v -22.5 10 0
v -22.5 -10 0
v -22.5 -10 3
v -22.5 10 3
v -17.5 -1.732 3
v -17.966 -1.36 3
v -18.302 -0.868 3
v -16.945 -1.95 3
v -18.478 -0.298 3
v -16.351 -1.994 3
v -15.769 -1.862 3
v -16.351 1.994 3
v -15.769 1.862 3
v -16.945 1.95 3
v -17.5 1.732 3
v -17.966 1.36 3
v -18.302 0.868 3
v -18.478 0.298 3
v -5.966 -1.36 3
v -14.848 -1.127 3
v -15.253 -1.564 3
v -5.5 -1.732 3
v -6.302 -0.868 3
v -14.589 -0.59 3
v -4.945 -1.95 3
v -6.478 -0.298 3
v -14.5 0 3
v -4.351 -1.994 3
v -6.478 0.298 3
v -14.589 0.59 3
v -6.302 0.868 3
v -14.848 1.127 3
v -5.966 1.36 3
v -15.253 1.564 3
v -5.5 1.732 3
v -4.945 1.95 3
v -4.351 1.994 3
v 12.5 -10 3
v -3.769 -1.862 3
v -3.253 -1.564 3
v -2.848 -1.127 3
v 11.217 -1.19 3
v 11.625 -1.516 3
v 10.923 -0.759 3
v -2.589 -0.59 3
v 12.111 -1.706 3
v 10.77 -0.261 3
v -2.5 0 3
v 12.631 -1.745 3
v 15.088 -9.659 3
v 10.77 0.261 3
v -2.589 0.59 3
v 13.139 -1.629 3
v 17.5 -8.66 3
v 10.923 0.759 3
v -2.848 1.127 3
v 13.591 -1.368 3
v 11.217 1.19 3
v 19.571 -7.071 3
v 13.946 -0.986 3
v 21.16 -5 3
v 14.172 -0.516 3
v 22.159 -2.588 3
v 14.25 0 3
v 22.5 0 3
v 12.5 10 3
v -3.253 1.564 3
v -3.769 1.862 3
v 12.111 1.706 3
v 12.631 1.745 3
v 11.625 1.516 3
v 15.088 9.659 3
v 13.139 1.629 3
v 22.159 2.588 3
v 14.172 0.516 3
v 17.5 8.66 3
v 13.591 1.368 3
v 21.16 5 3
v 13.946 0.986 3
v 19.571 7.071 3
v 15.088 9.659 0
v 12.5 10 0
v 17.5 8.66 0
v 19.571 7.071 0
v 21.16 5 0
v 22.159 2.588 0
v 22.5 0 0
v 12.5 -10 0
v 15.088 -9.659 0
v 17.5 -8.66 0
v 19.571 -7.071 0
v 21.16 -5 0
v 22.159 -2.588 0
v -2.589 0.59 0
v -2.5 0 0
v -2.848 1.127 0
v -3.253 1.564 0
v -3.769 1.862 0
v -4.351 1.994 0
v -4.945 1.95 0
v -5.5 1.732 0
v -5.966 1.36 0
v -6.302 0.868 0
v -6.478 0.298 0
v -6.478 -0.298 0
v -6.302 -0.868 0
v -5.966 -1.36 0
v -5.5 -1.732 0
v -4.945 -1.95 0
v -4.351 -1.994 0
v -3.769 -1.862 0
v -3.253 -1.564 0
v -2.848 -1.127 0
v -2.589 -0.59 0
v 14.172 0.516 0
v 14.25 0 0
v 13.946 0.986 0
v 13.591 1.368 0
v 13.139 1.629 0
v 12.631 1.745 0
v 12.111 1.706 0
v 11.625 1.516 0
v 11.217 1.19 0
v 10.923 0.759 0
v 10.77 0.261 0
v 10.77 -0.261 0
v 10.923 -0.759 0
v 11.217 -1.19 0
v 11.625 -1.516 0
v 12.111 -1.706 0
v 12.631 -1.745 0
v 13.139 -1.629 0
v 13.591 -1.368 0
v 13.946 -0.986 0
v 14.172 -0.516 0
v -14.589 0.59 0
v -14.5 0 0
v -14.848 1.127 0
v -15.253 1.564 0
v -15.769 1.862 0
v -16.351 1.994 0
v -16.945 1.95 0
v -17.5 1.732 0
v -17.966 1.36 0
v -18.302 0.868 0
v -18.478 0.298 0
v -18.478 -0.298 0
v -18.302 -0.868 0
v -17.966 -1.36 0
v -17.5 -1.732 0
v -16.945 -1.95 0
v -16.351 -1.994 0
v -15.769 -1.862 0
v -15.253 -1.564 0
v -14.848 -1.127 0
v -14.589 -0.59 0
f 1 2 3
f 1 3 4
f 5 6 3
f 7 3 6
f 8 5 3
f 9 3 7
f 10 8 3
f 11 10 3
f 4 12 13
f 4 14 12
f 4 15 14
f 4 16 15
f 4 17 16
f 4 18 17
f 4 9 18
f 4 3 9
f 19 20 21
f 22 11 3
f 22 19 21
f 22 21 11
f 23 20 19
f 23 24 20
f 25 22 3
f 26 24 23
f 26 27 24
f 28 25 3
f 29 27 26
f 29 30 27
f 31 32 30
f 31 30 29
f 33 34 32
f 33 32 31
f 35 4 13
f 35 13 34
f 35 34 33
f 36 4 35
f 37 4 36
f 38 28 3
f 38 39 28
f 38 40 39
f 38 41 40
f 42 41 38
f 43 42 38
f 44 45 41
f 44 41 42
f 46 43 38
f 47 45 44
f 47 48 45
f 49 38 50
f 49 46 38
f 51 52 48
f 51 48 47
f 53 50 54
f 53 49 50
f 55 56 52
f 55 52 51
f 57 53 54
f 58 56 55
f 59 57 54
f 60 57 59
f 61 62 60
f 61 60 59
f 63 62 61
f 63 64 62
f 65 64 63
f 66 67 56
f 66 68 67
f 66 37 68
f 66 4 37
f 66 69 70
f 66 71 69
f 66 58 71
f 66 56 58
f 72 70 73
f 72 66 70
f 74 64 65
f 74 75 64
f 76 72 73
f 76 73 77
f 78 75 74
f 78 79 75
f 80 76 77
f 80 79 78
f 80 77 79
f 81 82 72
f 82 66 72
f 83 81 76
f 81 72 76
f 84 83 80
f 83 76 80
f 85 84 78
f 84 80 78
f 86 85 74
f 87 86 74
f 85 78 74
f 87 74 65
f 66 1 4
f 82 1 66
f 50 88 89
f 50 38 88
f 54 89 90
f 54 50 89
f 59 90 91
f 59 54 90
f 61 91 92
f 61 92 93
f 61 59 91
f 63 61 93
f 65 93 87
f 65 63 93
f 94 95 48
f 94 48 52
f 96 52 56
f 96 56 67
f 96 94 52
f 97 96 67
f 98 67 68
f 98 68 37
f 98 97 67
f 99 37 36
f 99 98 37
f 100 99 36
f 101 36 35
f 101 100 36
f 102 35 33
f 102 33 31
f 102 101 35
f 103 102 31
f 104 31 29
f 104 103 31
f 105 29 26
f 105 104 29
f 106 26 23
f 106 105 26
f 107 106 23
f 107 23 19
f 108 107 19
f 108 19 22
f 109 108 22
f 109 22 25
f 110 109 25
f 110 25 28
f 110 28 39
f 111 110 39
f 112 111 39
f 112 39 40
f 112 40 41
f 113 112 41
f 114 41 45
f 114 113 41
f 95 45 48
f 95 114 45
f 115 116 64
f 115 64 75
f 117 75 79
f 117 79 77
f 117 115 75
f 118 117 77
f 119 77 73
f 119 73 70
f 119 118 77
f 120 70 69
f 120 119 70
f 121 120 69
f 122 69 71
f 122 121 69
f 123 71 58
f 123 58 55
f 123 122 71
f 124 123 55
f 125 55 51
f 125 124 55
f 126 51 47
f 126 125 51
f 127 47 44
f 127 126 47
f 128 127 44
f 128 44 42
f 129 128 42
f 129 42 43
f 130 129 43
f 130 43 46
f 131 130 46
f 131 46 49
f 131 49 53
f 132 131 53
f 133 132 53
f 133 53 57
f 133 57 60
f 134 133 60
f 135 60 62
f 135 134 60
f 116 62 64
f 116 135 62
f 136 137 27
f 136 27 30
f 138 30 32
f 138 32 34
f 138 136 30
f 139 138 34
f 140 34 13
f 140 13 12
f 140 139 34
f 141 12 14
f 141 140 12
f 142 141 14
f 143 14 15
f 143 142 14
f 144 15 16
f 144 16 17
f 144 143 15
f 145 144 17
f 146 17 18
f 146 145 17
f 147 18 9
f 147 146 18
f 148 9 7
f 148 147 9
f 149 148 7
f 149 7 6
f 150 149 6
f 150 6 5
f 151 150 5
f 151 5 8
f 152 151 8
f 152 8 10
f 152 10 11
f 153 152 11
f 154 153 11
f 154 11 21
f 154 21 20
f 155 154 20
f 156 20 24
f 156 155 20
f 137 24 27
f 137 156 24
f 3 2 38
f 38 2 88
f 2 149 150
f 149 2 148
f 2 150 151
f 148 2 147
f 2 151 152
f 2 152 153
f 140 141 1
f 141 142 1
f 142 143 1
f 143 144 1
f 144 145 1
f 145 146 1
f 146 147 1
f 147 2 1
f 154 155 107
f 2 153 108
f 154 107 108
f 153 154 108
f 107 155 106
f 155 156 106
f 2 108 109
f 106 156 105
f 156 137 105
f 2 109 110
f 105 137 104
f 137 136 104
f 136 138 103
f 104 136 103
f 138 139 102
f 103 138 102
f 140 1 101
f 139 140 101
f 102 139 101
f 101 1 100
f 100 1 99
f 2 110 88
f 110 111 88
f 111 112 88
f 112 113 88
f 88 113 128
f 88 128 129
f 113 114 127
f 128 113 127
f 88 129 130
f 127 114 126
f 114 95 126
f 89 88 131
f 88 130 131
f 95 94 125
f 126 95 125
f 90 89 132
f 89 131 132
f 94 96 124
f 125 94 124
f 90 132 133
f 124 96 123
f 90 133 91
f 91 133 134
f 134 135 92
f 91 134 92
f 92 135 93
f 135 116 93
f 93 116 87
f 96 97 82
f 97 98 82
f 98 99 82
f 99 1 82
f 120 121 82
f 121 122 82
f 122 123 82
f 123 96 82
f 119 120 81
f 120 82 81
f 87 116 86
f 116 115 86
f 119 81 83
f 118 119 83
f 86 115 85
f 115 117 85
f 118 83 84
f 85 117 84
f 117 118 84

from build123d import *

# Parameters (mm, degrees)
ESBO_O1_W                = 45
ESBO_O1_H                = 20
ESBO_O1_R                = 2
ESBO_O1_R_2              = 1.75
RESSALTO_EXTRUS_O1_DEPTH = 3
FILETE1_R                = 10


with BuildPart() as part:
    # Esboço1 → Ressalto-extrusão1 (new body)
    with BuildSketch(Plane.XY):
        Rectangle(ESBO_O1_W, ESBO_O1_H)
        with Locations((-16.5, 0)):
            Circle(ESBO_O1_R, mode=Mode.SUBTRACT)
        with Locations((-4.5, 0)):
            Circle(ESBO_O1_R, mode=Mode.SUBTRACT)
        with Locations((12.5, 0)):
            Circle(ESBO_O1_R_2, mode=Mode.SUBTRACT)
    extrude(amount=RESSALTO_EXTRUS_O1_DEPTH)

    # Filete1
    filete1_edges = [part.edges().sort_by_distance(p)[0] for p in [
        (22.5, -10, 1.5),
        (22.5, 10, 1.5),
    ]]
    fillet(filete1_edges, radius=FILETE1_R - 0.0001)  # a hair under: the kernel refuses the full size


solid = part.part
